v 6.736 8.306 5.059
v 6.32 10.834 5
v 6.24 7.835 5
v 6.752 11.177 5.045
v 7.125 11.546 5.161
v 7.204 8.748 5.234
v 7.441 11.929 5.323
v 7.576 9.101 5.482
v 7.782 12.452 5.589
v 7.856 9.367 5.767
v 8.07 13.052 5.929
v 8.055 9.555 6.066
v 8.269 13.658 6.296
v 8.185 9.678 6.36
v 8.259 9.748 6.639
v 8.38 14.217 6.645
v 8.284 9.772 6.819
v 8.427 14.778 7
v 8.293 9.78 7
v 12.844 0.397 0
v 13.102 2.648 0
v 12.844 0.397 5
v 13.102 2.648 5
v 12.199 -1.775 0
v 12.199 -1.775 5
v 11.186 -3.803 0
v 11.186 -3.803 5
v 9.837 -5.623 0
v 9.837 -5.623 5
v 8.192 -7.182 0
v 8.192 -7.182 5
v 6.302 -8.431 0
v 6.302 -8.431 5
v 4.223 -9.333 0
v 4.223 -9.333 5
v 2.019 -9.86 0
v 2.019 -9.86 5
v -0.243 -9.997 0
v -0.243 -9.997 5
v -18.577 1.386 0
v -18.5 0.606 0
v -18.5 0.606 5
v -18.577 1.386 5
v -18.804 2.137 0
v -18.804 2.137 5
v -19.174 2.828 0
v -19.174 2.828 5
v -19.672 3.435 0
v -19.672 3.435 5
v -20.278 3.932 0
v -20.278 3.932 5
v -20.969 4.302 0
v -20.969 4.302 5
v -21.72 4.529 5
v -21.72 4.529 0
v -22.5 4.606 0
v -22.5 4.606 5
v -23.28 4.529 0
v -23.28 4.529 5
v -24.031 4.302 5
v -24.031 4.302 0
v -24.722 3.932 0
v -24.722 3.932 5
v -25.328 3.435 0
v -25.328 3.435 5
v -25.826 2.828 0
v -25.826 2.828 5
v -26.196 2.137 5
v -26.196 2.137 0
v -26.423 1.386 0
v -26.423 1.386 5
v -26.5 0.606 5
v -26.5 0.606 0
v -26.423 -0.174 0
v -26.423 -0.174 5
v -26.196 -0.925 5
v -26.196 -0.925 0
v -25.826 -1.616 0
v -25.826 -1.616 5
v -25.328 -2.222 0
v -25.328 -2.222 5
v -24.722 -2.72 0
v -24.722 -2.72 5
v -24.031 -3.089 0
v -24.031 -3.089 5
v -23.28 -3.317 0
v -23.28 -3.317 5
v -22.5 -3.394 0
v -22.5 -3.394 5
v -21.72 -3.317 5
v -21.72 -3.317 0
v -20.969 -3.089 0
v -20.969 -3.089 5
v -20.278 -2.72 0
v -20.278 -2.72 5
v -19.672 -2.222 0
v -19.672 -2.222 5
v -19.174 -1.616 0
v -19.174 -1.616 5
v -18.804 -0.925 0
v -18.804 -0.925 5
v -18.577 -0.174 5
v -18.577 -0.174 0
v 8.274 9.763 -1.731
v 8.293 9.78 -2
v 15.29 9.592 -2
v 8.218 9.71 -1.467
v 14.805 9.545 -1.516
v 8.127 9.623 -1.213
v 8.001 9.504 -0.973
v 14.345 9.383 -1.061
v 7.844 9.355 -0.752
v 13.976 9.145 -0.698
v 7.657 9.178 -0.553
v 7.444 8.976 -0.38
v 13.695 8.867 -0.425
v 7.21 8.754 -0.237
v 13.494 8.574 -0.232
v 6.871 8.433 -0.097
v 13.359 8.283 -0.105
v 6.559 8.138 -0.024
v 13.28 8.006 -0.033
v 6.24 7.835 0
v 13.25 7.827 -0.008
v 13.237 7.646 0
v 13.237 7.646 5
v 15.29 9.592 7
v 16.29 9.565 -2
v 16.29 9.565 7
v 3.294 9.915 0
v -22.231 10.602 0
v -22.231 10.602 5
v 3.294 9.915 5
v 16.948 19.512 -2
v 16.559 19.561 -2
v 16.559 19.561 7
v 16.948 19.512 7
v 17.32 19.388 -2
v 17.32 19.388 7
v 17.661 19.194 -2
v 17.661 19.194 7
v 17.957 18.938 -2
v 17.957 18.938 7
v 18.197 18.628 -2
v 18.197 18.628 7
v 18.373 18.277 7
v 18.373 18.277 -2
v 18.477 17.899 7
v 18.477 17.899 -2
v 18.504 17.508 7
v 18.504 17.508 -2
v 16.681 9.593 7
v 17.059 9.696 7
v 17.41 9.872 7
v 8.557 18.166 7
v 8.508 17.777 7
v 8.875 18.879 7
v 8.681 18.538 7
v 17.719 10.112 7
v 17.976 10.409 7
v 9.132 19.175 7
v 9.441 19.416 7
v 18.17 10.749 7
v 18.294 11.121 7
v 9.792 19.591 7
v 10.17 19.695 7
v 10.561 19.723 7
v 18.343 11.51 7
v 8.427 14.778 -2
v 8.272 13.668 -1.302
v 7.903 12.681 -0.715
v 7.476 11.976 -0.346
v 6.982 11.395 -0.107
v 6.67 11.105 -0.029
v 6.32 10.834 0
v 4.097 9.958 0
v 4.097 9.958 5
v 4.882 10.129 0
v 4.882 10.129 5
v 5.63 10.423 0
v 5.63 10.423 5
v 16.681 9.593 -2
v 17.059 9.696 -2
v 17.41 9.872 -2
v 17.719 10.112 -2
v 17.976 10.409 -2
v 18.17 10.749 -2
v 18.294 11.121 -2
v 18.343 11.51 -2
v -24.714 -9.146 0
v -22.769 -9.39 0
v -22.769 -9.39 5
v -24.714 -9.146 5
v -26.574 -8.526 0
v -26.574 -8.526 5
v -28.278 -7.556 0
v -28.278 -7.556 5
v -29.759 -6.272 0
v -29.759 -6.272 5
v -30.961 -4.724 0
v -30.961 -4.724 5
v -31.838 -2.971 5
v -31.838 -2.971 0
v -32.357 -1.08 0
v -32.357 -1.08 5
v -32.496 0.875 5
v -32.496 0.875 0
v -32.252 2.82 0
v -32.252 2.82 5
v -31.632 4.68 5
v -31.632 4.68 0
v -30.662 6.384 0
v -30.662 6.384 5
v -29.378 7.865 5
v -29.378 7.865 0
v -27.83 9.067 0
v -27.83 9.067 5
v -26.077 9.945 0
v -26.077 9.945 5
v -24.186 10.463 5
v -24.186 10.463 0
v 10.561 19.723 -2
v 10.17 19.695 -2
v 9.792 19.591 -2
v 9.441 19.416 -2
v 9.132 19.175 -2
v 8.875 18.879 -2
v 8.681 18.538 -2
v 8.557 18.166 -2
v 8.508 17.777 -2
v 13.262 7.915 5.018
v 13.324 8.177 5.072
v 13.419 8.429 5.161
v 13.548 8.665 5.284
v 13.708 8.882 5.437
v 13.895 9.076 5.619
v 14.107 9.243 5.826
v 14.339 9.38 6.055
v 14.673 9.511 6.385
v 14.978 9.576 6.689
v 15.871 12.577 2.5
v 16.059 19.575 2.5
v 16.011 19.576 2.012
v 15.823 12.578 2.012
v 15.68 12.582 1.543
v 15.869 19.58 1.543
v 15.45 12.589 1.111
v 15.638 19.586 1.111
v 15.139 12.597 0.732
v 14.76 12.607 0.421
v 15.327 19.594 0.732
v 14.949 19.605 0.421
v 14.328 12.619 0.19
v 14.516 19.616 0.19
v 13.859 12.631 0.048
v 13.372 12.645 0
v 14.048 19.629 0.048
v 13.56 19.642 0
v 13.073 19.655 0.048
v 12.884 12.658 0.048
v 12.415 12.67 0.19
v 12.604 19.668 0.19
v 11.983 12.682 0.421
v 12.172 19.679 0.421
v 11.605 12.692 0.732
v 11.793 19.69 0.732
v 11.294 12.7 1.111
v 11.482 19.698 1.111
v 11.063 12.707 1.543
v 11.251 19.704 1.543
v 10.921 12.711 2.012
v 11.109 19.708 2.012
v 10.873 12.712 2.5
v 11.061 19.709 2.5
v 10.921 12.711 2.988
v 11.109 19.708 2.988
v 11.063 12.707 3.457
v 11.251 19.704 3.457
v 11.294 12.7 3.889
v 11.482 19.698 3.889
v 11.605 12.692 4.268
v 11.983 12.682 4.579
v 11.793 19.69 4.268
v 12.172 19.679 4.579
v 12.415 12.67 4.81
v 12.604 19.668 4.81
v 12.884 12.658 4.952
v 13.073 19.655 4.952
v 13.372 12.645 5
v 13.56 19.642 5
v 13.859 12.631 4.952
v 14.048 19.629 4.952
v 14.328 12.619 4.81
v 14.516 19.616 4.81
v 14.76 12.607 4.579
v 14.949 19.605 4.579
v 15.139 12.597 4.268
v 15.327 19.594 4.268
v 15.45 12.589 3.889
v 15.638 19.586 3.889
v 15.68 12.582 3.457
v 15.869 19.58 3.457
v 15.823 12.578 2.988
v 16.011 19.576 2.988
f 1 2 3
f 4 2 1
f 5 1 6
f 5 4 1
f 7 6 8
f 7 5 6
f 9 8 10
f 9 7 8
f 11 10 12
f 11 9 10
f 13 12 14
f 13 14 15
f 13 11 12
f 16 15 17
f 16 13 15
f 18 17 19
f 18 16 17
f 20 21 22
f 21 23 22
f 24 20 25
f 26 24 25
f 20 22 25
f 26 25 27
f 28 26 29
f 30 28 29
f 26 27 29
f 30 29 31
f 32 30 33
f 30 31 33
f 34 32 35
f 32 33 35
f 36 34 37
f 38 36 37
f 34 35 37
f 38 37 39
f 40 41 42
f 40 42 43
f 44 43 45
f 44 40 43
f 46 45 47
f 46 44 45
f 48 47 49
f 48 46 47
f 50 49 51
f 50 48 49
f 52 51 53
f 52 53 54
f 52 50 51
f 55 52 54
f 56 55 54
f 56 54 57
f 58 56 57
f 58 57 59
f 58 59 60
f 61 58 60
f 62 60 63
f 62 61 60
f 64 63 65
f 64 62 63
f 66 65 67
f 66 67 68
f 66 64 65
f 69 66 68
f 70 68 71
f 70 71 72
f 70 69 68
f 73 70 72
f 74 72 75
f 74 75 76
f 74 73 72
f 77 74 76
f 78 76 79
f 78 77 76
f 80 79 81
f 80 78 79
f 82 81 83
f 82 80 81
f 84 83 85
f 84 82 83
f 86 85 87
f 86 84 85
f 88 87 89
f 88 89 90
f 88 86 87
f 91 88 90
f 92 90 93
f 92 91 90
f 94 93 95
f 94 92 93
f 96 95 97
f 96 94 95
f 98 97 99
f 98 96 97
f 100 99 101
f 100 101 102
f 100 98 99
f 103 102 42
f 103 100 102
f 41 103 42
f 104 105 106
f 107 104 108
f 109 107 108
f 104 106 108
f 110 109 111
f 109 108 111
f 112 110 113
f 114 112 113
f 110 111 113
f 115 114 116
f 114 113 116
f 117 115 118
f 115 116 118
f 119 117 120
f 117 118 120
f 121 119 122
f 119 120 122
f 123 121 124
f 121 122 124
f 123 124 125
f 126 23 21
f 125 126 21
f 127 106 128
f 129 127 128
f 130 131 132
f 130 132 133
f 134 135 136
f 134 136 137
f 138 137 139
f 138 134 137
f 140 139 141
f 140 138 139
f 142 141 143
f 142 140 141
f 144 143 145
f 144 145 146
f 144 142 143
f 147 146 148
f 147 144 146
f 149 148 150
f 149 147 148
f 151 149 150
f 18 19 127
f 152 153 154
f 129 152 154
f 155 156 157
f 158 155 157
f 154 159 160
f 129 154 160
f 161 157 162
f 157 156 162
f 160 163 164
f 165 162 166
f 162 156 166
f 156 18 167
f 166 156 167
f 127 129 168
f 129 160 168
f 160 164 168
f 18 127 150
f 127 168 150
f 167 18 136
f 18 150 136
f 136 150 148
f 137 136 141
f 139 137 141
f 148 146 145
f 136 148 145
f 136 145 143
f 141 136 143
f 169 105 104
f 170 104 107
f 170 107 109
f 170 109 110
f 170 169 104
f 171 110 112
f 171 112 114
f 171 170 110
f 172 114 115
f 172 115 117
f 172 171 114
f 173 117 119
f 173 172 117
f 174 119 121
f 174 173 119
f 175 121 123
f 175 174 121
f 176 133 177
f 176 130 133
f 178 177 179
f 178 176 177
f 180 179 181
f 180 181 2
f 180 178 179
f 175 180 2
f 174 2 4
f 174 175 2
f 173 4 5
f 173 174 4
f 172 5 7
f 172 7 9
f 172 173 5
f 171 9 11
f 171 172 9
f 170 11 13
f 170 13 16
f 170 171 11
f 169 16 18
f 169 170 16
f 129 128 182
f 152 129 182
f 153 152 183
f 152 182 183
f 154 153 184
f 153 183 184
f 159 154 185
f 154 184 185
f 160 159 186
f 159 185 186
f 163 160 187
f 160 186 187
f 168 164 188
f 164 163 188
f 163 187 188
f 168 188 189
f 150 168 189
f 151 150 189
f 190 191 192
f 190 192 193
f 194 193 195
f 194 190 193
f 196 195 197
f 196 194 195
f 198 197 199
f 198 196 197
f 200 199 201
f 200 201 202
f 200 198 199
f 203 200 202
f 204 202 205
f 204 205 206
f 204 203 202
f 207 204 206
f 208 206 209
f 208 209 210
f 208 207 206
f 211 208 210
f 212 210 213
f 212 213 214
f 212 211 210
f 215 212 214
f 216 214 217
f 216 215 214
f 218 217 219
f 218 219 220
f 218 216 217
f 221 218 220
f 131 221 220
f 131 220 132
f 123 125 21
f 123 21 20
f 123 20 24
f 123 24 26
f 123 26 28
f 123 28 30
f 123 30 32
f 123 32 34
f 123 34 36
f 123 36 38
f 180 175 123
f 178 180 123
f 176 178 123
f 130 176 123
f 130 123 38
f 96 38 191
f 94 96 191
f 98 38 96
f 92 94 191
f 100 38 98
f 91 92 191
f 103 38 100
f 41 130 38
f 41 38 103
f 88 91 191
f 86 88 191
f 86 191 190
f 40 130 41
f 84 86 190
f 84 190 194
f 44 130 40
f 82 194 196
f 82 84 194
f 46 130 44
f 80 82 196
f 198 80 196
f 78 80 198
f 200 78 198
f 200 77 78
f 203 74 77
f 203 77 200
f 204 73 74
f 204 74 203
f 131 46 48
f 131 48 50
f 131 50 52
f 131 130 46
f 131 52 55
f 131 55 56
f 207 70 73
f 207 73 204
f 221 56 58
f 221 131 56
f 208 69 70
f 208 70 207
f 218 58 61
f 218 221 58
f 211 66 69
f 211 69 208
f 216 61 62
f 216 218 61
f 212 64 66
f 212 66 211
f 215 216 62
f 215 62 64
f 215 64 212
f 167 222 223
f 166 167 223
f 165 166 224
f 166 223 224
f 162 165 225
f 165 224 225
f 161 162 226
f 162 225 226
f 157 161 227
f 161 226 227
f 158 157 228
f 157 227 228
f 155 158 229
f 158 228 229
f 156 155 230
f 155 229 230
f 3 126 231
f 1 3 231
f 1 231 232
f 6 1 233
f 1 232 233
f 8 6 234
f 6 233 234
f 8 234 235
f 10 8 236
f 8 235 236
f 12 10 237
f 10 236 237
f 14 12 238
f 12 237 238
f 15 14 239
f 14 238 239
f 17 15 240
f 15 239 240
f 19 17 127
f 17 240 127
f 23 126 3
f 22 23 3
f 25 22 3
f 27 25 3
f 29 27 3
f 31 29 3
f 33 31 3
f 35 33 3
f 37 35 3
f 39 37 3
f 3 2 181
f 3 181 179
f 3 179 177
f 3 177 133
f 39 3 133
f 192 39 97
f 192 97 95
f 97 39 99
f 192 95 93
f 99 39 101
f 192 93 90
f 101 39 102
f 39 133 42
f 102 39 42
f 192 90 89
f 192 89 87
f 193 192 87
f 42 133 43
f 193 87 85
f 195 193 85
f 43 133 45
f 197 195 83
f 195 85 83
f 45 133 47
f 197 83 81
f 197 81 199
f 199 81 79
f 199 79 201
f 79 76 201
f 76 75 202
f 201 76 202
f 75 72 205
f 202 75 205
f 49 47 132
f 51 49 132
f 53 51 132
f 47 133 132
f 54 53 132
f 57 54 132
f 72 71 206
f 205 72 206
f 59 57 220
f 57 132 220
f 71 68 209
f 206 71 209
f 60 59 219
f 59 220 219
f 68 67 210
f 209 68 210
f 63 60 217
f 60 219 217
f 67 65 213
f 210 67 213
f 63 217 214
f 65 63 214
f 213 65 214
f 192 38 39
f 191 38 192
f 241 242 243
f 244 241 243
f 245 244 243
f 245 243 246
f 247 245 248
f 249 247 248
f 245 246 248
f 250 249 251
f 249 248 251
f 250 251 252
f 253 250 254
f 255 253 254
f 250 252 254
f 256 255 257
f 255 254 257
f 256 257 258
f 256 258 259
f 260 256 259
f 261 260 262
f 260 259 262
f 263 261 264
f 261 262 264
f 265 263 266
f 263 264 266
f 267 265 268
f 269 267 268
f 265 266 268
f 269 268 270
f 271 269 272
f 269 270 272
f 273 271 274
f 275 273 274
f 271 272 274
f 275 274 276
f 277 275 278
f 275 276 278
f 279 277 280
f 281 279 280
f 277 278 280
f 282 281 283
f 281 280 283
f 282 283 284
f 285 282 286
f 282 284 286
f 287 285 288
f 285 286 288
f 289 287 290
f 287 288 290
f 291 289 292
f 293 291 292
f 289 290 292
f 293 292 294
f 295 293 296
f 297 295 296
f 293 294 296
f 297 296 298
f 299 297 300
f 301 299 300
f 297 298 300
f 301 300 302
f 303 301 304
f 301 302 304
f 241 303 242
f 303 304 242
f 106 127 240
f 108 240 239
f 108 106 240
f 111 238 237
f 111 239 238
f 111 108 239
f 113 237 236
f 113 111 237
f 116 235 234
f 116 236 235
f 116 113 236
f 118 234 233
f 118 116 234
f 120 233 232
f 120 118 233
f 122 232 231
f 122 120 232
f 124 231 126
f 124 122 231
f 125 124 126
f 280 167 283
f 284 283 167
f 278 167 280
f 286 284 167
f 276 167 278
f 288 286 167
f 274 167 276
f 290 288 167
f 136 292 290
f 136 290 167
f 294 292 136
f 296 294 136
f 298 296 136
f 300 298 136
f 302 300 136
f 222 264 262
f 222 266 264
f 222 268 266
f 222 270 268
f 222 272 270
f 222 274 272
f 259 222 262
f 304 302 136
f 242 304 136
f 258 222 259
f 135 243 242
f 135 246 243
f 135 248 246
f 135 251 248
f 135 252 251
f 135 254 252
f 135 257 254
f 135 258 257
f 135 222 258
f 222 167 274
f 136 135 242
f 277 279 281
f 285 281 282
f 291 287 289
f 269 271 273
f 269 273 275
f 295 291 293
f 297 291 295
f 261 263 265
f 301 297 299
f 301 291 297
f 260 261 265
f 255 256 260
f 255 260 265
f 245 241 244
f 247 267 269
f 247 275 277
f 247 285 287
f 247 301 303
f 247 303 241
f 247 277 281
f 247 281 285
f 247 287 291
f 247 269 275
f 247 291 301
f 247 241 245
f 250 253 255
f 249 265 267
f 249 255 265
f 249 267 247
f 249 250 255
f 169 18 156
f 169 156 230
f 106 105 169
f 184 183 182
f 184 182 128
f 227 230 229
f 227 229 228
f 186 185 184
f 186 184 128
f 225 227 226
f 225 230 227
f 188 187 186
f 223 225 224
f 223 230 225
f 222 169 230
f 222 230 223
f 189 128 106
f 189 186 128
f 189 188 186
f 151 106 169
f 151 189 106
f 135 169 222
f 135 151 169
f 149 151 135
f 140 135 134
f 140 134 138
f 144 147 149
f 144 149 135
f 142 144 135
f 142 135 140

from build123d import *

# Parameters (mm, degrees)
SKETCH1_R           = 4
BOSS_EXTRUDE1_DEPTH = 5
SKETCH2_W           = 29.745771512
SKETCH2_H           = 31.069071225
CUT_EXTRUDE1_DEPTH  = 22.477415783
SKETCH3_W           = 10
SKETCH3_H           = 15
BOSS_EXTRUDE2_DEPTH = 10
FILLET1_R           = 13
FILLET2_R           = 5
FILLET3_R           = 2
FILLET4_R           = 2
SKETCH4_R           = 2.5
CUT_EXTRUDE2_DEPTH  = 7
SKETCH6_W           = 5.480044722
SKETCH6_H           = 16.421651107
CUT_EXTRUDE3_DEPTH  = 52.045615162


with BuildPart() as part:
    # Sketch1 → Boss-Extrude1 (new body)
    with BuildSketch(Plane.XY):
        with BuildLine():
            Line((-22.23071963, 10.602474367), (22.76928037, 9.390273126))
            ThreePointArc((22.76928037, 9.390273126), (32.496373747, -0.875380991), (22.23071963, -10.602474367))
            Line((22.23071963, -10.602474367), (-22.76928037, -9.390273126))
            ThreePointArc((-22.76928037, -9.390273126), (-32.496373747, 0.875380991), (-22.23071963, 10.602474367))
        make_face()
        with Locations((22.5, -0.606100621)):
            Circle(SKETCH1_R, mode=Mode.SUBTRACT)
        with Locations((-22.5, 0.606100621)):
            Circle(SKETCH1_R, mode=Mode.SUBTRACT)
    extrude(amount=BOSS_EXTRUDE1_DEPTH)

    # Sketch2 → Cut-Extrude1 (cut, through all)
    with BuildSketch(Plane(origin=(0.26928037, 9.996373747, 0), x_dir=(0.999637375, -0.026928037, 0), z_dir=(0.026928037, 0.999637375, 0))):
        with Locations((27.899171519, 0.562166988)):
            Rectangle(SKETCH2_W, SKETCH2_H)
    extrude(amount=-CUT_EXTRUDE1_DEPTH, mode=Mode.SUBTRACT)

    # Sketch3 → Boss-Extrude2 (add)
    with BuildSketch(Plane(origin=(0.26928037, 9.996373747, 0), x_dir=(0.999637375, -0.026928037, 0), z_dir=(0.026928037, 0.999637375, 0))):
        with Locations((13.026285763, -2.5)):
            Rectangle(SKETCH3_W, SKETCH3_H)
    extrude(amount=BOSS_EXTRUDE2_DEPTH)

    # Fillet1
    fillet1_edges = [part.edges().sort_by_distance(p)[0] for p in [
        (12.752281732, -10.347146052, 2.5),
    ]]
    fillet(fillet1_edges, radius=FILLET1_R)

    # Fillet2
    fillet2_edges = [part.edges().sort_by_distance(p)[0] for p in [
        (8.292655599, 9.780241626, 2.5),
    ]]
    fillet(fillet2_edges, radius=FILLET2_R)

    # Fillet3
    fillet3_edges = [part.edges().sort_by_distance(p)[0] for p in [
        (10.791749036, 9.712921534, 0),
        (10.791749036, 9.712921534, 5),
        (13.290842472, 9.645601441, 2.5),
        (8.359975692, 12.279335063, 0),
        (8.359975692, 12.279335063, 5),
    ]]
    fillet(fillet3_edges, radius=FILLET3_R)

    # Fillet4
    fillet4_edges = [part.edges().sort_by_distance(p)[0] for p in [
        (8.427295784, 14.7784285, -5),
        (8.427295784, 14.7784285, 10),
        (18.289029346, 9.510961256, 2.5),
        (18.423669531, 14.509148129, 10),
        (18.423669531, 14.509148129, -5),
        (8.561935969, 19.776615373, 2.5),
        (13.560122843, 19.641975188, 10),
        (18.558309716, 19.507335003, 2.5),
        (13.560122843, 19.641975188, -5),
    ]]
    fillet(fillet4_edges, radius=FILLET4_R)

    # Sketch4 → Cut-Extrude2 (cut)
    with BuildSketch(Plane(origin=(0.538560741, 19.992747493, 0), x_dir=(0.999637375, -0.026928037, 0), z_dir=(0.026928037, 0.999637375, 0))):
        with Locations((13.026285763, -2.5)):
            Circle(SKETCH4_R)
    extrude(amount=-CUT_EXTRUDE2_DEPTH, mode=Mode.SUBTRACT)

    # Sketch6 → Cut-Extrude3 (cut, through all)
    with BuildSketch(Plane(origin=(18.019748975, -0.485412491, 0), x_dir=(0, 0, -1), z_dir=(0.999637375, -0.026928037, 0))):
        with Locations((4.740022361, 14.542229601)):
            Rectangle(SKETCH6_W, SKETCH6_H)
        with Locations((-9.740022361, 14.542229601)):
            Rectangle(SKETCH6_W, SKETCH6_H)
    extrude(amount=-CUT_EXTRUDE3_DEPTH, mode=Mode.SUBTRACT)


solid = part.part
